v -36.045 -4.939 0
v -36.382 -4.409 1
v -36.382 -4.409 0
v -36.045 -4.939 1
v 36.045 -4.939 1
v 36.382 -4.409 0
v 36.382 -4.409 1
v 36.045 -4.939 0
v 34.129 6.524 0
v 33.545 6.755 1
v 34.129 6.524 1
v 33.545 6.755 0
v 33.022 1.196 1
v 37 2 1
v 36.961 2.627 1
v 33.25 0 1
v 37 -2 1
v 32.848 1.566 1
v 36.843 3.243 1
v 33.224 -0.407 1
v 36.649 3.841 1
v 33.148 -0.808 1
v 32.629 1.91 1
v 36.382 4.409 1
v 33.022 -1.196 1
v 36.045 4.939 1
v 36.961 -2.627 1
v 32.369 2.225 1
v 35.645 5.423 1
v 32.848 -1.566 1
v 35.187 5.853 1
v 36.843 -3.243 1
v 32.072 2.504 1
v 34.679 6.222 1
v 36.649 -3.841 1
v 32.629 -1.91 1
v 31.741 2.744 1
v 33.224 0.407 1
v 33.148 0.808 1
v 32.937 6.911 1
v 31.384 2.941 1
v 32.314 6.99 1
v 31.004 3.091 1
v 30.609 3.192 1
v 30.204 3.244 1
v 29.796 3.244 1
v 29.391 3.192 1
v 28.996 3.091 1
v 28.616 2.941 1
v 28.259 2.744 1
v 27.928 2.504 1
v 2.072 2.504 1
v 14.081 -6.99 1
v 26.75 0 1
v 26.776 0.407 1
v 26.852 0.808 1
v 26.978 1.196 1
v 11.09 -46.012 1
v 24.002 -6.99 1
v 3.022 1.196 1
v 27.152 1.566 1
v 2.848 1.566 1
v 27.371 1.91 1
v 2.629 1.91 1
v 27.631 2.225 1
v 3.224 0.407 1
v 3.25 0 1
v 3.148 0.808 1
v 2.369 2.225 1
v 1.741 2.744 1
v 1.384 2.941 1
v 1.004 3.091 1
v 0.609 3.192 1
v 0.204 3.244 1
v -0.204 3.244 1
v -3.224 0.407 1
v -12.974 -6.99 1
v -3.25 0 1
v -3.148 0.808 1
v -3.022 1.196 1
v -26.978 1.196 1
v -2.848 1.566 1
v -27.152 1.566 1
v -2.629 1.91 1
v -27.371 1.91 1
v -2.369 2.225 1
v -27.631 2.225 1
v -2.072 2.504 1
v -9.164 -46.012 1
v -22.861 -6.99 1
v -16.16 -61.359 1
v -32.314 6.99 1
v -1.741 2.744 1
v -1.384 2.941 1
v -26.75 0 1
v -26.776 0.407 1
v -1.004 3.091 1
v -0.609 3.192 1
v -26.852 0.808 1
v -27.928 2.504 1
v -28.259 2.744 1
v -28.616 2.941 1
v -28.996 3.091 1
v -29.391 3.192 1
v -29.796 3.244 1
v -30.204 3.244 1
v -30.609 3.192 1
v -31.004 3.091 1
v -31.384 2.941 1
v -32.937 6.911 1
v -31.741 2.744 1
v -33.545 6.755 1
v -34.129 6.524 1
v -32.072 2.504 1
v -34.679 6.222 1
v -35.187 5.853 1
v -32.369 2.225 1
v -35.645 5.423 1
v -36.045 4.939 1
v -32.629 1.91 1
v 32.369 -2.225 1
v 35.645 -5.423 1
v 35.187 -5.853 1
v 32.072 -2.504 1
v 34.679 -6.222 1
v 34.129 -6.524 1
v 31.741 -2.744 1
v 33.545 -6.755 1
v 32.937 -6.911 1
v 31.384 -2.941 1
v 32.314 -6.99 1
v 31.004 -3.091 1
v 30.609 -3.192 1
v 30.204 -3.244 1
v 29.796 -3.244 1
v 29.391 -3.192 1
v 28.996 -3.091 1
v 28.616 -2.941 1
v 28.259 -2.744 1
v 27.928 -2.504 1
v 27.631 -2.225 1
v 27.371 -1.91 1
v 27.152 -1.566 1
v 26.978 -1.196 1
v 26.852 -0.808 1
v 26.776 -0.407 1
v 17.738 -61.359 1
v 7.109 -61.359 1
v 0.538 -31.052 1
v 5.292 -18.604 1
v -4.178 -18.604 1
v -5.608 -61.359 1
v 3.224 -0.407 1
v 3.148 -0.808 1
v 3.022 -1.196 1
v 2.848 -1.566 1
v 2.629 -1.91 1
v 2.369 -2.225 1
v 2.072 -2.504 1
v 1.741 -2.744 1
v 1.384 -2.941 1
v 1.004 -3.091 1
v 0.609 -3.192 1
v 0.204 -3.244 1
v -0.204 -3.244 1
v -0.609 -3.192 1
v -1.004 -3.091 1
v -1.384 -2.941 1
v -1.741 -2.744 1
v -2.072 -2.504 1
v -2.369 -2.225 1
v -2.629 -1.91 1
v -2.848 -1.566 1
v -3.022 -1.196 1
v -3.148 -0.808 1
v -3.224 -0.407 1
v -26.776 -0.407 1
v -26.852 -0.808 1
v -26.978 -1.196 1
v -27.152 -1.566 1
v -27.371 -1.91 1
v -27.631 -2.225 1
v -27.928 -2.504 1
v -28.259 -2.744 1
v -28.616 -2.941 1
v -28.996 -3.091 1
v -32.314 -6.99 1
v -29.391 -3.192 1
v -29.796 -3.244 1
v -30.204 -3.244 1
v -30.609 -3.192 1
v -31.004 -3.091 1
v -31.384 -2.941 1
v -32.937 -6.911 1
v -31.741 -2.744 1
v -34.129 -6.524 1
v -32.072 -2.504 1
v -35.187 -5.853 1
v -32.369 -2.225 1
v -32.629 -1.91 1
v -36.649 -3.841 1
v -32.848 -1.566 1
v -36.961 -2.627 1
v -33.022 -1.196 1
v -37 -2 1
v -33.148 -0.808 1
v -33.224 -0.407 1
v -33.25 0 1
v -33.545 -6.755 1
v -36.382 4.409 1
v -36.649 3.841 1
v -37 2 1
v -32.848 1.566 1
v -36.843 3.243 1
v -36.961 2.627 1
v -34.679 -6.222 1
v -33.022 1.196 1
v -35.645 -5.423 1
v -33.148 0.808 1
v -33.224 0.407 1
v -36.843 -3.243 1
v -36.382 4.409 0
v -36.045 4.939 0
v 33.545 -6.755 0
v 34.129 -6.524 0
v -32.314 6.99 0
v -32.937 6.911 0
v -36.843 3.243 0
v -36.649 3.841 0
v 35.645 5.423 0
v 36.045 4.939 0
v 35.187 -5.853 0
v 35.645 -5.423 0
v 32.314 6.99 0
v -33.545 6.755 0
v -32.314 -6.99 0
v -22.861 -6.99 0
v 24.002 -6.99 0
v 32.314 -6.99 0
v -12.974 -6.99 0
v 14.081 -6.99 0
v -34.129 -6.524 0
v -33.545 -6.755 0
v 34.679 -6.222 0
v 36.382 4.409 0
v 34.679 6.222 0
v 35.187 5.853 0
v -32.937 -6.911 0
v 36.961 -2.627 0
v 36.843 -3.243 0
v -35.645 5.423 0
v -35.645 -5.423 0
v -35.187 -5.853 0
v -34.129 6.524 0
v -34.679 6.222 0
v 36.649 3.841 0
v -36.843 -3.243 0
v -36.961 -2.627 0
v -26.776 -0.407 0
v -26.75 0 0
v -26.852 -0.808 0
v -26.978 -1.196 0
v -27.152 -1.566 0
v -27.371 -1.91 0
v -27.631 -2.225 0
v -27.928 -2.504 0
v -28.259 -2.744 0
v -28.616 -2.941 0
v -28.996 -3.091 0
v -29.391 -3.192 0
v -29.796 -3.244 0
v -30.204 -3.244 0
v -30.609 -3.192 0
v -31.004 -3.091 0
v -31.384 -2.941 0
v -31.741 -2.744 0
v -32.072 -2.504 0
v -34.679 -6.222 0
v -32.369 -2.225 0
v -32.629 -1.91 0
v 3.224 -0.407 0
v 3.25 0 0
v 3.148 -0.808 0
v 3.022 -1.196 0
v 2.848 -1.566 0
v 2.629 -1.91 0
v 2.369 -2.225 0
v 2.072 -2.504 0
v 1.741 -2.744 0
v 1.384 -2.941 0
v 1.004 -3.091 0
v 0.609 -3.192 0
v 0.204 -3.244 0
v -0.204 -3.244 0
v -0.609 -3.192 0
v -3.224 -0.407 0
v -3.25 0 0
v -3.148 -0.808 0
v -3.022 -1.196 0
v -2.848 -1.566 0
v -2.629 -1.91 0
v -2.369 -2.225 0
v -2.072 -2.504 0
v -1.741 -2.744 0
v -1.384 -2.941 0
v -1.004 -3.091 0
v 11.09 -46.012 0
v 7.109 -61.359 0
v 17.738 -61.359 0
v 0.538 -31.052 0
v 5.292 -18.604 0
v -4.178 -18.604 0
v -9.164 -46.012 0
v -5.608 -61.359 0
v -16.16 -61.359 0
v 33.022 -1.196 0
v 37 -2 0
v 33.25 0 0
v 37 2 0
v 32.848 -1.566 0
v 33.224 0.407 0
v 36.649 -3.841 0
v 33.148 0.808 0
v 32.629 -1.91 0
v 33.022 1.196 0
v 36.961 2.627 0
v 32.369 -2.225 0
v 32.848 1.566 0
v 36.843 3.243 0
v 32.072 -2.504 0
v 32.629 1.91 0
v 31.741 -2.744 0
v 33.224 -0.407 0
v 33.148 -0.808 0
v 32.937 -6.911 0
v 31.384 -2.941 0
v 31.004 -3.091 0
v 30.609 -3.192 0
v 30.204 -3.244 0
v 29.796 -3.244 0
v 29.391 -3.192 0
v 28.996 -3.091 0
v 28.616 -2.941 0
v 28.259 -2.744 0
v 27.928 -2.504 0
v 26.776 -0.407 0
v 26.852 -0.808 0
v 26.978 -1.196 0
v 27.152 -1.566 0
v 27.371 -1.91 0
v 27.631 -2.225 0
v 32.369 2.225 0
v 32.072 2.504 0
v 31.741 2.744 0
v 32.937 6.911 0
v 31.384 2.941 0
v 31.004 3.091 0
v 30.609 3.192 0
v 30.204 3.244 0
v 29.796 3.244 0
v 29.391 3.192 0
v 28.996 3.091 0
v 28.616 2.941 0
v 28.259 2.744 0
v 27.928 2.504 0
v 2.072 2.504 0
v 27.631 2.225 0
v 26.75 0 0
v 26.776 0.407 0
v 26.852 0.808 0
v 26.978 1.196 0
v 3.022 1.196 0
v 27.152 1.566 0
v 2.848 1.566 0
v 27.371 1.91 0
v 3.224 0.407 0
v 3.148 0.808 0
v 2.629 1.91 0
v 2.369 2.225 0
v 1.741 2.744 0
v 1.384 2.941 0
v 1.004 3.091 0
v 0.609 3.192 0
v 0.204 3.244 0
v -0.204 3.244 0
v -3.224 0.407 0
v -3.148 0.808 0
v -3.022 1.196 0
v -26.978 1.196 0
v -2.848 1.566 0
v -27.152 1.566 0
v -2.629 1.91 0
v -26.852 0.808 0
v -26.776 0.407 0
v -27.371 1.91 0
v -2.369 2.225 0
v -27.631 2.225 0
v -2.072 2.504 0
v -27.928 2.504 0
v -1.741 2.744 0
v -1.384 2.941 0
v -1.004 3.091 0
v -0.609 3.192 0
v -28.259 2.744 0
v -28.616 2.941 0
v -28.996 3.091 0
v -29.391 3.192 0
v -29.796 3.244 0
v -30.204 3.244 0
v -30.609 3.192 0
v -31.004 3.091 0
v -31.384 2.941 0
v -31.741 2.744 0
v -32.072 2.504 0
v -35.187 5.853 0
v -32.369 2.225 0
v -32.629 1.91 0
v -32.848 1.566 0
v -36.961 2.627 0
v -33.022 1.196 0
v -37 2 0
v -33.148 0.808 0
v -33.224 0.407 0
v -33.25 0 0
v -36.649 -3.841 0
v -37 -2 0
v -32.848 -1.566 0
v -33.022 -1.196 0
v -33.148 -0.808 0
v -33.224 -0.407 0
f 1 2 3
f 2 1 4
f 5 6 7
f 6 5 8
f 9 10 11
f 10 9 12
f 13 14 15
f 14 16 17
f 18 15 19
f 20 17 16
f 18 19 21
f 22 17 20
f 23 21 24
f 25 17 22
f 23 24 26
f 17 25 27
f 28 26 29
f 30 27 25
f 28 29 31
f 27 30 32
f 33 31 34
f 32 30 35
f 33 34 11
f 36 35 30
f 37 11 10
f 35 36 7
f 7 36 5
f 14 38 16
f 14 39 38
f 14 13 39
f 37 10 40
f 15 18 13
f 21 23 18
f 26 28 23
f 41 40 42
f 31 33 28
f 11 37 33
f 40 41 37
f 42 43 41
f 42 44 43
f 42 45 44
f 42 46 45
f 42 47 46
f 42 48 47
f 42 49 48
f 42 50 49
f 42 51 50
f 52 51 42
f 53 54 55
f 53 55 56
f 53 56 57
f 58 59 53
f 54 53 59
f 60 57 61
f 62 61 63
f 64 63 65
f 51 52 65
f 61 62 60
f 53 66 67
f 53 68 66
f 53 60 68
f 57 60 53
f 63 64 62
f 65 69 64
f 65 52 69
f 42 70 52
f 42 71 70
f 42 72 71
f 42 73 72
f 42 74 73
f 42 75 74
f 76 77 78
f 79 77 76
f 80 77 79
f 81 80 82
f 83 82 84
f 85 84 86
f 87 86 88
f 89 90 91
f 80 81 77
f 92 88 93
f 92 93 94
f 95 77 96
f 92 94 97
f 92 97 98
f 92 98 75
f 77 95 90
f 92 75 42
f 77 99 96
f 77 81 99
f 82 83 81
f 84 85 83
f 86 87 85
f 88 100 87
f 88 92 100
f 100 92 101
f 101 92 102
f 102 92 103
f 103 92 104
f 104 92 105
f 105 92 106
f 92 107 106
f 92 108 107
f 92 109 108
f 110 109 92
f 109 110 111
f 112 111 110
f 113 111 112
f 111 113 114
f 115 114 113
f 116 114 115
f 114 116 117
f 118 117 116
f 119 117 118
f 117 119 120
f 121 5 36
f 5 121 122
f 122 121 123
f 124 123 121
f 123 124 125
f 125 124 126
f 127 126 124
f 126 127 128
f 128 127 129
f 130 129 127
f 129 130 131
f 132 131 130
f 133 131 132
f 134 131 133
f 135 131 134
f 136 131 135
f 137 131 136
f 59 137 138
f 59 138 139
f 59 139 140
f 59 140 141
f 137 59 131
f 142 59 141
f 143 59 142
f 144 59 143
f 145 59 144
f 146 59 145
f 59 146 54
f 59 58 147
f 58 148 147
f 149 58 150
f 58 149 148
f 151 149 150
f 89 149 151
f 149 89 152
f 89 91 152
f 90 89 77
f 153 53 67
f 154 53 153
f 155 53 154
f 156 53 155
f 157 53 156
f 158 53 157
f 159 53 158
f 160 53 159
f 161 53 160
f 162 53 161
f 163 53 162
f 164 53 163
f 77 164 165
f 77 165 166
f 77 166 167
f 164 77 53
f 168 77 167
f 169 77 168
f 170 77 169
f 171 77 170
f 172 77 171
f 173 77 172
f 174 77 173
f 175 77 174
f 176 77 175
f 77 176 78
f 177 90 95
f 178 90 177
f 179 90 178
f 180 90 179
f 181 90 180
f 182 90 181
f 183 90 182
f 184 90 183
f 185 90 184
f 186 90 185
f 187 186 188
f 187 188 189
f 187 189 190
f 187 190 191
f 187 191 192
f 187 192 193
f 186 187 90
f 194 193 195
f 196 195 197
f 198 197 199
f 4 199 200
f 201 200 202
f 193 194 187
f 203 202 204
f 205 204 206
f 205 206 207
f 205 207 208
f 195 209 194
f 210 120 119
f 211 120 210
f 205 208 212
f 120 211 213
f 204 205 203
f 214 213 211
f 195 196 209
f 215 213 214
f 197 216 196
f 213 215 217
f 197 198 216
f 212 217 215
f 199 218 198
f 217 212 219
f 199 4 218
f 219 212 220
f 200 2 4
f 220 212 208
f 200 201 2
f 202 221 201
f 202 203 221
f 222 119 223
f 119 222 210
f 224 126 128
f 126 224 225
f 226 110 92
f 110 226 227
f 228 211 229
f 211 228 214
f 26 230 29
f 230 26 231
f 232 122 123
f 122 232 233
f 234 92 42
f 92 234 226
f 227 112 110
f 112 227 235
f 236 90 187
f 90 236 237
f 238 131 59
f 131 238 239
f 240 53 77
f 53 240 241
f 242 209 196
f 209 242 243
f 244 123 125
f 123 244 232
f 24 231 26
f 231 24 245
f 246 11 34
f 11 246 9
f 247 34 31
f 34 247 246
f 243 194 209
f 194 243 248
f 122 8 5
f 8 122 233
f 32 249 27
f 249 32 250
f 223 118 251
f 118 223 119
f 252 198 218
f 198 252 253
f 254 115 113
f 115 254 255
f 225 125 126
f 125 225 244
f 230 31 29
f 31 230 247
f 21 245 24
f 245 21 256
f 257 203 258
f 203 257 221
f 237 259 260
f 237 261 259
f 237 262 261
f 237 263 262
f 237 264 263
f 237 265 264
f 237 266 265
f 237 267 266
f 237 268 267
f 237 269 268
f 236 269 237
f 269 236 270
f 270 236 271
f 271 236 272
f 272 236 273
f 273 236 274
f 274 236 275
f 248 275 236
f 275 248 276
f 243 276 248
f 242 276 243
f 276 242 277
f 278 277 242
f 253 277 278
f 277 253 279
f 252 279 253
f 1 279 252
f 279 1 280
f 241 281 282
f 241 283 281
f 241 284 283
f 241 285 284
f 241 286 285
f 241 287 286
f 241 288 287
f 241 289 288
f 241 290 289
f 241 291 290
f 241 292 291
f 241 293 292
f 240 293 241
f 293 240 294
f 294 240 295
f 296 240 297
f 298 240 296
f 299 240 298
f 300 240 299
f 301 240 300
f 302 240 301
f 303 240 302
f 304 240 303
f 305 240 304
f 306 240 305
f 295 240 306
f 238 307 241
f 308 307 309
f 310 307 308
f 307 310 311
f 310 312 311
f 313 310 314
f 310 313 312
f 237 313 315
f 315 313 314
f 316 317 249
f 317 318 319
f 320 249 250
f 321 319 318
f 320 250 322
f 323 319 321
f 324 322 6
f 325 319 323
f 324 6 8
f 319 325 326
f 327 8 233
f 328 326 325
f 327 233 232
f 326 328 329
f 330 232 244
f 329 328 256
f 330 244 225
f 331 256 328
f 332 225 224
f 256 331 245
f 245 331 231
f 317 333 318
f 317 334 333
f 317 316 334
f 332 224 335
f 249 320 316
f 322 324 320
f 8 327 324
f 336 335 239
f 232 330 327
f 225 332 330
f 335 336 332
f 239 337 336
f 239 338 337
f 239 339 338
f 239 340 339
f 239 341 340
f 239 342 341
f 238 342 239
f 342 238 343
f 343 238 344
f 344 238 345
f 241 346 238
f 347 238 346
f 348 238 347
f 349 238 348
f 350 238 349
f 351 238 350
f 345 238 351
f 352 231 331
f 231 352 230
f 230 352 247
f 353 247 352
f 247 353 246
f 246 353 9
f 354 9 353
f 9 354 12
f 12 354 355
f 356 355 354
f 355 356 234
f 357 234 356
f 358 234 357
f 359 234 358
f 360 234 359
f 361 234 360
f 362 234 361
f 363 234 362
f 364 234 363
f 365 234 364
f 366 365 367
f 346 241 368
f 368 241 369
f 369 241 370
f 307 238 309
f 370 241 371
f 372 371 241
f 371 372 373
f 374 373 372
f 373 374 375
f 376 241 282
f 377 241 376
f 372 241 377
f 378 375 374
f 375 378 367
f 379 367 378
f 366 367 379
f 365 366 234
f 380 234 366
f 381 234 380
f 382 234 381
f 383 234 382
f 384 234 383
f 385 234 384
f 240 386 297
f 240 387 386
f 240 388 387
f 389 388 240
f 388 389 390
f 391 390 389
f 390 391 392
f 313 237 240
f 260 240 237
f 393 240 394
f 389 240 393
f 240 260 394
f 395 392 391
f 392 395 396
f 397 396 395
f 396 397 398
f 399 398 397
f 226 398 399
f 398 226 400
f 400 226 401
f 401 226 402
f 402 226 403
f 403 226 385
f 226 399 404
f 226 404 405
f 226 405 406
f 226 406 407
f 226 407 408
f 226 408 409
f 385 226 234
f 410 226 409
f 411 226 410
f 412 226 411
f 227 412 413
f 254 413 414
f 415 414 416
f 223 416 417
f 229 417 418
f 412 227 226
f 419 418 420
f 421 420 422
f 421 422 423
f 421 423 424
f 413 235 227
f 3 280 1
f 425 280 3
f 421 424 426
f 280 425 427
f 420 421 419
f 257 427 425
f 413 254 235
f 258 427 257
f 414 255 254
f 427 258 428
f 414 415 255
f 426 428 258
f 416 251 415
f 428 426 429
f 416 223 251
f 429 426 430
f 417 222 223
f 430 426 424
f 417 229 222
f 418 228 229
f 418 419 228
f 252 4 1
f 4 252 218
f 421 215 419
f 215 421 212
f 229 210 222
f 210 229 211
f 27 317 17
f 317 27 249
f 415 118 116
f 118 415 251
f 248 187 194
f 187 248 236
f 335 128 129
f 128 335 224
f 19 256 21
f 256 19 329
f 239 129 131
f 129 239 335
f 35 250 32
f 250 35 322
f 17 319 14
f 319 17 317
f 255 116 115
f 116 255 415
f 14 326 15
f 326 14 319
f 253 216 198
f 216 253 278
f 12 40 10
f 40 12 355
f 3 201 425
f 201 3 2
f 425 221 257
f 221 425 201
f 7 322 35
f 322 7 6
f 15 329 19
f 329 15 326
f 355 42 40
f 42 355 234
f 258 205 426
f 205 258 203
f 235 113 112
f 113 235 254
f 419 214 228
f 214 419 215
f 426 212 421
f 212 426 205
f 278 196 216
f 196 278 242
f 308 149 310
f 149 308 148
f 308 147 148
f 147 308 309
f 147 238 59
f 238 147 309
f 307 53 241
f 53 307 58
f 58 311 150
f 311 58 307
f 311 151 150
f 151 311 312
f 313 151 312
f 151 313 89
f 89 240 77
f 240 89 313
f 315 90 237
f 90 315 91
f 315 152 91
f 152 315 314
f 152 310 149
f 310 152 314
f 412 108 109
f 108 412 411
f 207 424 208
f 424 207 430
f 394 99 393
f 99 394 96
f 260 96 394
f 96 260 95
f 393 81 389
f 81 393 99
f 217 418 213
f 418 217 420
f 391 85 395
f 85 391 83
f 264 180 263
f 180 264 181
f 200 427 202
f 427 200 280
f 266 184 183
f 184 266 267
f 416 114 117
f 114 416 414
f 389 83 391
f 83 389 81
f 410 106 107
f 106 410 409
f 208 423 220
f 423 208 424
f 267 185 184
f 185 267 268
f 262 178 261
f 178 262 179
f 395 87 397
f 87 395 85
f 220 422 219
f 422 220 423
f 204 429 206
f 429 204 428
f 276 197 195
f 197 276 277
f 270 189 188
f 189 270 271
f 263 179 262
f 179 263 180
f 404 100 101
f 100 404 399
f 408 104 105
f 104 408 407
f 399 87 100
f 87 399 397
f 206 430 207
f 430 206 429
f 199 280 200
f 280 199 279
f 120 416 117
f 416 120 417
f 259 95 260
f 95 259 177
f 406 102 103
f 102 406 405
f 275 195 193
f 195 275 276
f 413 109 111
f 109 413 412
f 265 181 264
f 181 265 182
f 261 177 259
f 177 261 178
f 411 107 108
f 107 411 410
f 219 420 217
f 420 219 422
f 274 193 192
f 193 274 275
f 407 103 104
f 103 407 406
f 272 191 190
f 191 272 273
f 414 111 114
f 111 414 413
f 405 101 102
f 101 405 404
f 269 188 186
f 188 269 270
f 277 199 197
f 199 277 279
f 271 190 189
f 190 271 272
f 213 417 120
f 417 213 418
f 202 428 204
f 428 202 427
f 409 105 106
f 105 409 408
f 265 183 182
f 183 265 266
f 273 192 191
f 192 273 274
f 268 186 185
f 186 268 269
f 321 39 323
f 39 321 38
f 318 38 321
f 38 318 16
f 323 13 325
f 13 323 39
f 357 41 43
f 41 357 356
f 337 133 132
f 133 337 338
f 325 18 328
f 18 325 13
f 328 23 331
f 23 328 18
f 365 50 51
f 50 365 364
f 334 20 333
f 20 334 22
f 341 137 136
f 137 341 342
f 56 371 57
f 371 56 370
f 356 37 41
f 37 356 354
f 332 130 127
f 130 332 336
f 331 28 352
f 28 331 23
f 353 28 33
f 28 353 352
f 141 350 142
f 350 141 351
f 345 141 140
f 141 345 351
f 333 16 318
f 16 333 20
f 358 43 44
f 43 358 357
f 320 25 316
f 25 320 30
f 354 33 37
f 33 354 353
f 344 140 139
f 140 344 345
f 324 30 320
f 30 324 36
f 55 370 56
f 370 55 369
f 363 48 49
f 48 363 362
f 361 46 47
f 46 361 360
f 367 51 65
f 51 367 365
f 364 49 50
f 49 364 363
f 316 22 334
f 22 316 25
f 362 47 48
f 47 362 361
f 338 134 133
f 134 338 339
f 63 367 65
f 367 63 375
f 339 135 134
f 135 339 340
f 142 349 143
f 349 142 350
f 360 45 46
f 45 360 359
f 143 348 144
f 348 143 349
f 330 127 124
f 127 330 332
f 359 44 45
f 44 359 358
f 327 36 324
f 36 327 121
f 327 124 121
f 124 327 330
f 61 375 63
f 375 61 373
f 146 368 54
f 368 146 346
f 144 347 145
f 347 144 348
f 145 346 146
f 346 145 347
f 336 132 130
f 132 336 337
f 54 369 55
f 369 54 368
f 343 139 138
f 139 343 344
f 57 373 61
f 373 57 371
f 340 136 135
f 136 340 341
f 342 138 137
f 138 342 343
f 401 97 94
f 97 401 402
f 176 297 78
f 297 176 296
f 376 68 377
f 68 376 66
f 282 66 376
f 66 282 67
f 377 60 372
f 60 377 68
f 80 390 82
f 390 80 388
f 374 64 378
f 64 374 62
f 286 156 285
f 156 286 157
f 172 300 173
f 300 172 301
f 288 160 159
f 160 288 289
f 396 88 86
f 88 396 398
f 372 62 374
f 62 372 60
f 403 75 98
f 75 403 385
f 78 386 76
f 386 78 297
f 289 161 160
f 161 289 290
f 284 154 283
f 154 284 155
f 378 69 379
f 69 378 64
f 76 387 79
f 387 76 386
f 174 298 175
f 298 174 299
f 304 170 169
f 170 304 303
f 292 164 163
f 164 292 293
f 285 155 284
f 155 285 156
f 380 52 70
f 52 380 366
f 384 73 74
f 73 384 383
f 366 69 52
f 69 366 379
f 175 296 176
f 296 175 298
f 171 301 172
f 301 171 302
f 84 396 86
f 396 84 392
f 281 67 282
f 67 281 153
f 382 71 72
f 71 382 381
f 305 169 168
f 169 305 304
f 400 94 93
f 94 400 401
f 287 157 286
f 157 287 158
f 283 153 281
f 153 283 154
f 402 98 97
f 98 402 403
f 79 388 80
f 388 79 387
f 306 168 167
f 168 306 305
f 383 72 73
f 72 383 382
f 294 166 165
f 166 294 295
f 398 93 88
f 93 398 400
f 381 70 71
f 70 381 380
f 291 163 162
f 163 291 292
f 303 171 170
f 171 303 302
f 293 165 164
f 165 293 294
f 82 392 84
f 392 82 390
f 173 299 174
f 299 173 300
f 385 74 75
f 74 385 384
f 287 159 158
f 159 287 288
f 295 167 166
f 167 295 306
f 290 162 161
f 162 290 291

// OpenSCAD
$fn = 50;


difference() {
	union() {
		translate(v = [0, 0, 0]) {
			rotate(a = [0, 0, 0]) {
				hull() {
					translate(v = [-32.0000000000, 2.0000000000, 0]) {
						rotate(a = [0, 0, 0]) {
							translate(v = [0, 0, 0]) {
								rotate(a = [0, 0, 0]) {
									cylinder(h = 1, r = 5);
								}
							}
						}
					}
					translate(v = [32.0000000000, 2.0000000000, 0]) {
						rotate(a = [0, 0, 0]) {
							translate(v = [0, 0, 0]) {
								rotate(a = [0, 0, 0]) {
									cylinder(h = 1, r = 5);
								}
							}
						}
					}
					translate(v = [-32.0000000000, -2.0000000000, 0]) {
						rotate(a = [0, 0, 0]) {
							translate(v = [0, 0, 0]) {
								rotate(a = [0, 0, 0]) {
									cylinder(h = 1, r = 5);
								}
							}
						}
					}
					translate(v = [32.0000000000, -2.0000000000, 0]) {
						rotate(a = [0, 0, 0]) {
							translate(v = [0, 0, 0]) {
								rotate(a = [0, 0, 0]) {
									cylinder(h = 1, r = 5);
								}
							}
						}
					}
				}
			}
		}
		translate(v = [0, -5, 0]) {
			rotate(a = [0, 0, 0]) {
				linear_extrude(height = 1) {
					text(font = "DejaVu Sans Mono:style=Bold", halign = "center", size = 57.0000000000, text = "W", valign = "top");
				}
			}
		}
	}
	union() {
		translate(v = [-30.0000000000, 0.0000000000, -125.0000000000]) {
			rotate(a = [0, 0, 0]) {
				cylinder(h = 250, r = 3.2500000000);
			}
		}
		translate(v = [30.0000000000, 0.0000000000, -125.0000000000]) {
			rotate(a = [0, 0, 0]) {
				cylinder(h = 250, r = 3.2500000000);
			}
		}
		translate(v = [30.0000000000, 0.0000000000, -125.0000000000]) {
			rotate(a = [0, 0, 0]) {
				cylinder(h = 250, r = 3.2500000000);
			}
		}
		translate(v = [0, 0, -125.0000000000]) {
			rotate(a = [0, 0, 0]) {
				cylinder(h = 250, r = 3.2500000000);
			}
		}
	}
}
